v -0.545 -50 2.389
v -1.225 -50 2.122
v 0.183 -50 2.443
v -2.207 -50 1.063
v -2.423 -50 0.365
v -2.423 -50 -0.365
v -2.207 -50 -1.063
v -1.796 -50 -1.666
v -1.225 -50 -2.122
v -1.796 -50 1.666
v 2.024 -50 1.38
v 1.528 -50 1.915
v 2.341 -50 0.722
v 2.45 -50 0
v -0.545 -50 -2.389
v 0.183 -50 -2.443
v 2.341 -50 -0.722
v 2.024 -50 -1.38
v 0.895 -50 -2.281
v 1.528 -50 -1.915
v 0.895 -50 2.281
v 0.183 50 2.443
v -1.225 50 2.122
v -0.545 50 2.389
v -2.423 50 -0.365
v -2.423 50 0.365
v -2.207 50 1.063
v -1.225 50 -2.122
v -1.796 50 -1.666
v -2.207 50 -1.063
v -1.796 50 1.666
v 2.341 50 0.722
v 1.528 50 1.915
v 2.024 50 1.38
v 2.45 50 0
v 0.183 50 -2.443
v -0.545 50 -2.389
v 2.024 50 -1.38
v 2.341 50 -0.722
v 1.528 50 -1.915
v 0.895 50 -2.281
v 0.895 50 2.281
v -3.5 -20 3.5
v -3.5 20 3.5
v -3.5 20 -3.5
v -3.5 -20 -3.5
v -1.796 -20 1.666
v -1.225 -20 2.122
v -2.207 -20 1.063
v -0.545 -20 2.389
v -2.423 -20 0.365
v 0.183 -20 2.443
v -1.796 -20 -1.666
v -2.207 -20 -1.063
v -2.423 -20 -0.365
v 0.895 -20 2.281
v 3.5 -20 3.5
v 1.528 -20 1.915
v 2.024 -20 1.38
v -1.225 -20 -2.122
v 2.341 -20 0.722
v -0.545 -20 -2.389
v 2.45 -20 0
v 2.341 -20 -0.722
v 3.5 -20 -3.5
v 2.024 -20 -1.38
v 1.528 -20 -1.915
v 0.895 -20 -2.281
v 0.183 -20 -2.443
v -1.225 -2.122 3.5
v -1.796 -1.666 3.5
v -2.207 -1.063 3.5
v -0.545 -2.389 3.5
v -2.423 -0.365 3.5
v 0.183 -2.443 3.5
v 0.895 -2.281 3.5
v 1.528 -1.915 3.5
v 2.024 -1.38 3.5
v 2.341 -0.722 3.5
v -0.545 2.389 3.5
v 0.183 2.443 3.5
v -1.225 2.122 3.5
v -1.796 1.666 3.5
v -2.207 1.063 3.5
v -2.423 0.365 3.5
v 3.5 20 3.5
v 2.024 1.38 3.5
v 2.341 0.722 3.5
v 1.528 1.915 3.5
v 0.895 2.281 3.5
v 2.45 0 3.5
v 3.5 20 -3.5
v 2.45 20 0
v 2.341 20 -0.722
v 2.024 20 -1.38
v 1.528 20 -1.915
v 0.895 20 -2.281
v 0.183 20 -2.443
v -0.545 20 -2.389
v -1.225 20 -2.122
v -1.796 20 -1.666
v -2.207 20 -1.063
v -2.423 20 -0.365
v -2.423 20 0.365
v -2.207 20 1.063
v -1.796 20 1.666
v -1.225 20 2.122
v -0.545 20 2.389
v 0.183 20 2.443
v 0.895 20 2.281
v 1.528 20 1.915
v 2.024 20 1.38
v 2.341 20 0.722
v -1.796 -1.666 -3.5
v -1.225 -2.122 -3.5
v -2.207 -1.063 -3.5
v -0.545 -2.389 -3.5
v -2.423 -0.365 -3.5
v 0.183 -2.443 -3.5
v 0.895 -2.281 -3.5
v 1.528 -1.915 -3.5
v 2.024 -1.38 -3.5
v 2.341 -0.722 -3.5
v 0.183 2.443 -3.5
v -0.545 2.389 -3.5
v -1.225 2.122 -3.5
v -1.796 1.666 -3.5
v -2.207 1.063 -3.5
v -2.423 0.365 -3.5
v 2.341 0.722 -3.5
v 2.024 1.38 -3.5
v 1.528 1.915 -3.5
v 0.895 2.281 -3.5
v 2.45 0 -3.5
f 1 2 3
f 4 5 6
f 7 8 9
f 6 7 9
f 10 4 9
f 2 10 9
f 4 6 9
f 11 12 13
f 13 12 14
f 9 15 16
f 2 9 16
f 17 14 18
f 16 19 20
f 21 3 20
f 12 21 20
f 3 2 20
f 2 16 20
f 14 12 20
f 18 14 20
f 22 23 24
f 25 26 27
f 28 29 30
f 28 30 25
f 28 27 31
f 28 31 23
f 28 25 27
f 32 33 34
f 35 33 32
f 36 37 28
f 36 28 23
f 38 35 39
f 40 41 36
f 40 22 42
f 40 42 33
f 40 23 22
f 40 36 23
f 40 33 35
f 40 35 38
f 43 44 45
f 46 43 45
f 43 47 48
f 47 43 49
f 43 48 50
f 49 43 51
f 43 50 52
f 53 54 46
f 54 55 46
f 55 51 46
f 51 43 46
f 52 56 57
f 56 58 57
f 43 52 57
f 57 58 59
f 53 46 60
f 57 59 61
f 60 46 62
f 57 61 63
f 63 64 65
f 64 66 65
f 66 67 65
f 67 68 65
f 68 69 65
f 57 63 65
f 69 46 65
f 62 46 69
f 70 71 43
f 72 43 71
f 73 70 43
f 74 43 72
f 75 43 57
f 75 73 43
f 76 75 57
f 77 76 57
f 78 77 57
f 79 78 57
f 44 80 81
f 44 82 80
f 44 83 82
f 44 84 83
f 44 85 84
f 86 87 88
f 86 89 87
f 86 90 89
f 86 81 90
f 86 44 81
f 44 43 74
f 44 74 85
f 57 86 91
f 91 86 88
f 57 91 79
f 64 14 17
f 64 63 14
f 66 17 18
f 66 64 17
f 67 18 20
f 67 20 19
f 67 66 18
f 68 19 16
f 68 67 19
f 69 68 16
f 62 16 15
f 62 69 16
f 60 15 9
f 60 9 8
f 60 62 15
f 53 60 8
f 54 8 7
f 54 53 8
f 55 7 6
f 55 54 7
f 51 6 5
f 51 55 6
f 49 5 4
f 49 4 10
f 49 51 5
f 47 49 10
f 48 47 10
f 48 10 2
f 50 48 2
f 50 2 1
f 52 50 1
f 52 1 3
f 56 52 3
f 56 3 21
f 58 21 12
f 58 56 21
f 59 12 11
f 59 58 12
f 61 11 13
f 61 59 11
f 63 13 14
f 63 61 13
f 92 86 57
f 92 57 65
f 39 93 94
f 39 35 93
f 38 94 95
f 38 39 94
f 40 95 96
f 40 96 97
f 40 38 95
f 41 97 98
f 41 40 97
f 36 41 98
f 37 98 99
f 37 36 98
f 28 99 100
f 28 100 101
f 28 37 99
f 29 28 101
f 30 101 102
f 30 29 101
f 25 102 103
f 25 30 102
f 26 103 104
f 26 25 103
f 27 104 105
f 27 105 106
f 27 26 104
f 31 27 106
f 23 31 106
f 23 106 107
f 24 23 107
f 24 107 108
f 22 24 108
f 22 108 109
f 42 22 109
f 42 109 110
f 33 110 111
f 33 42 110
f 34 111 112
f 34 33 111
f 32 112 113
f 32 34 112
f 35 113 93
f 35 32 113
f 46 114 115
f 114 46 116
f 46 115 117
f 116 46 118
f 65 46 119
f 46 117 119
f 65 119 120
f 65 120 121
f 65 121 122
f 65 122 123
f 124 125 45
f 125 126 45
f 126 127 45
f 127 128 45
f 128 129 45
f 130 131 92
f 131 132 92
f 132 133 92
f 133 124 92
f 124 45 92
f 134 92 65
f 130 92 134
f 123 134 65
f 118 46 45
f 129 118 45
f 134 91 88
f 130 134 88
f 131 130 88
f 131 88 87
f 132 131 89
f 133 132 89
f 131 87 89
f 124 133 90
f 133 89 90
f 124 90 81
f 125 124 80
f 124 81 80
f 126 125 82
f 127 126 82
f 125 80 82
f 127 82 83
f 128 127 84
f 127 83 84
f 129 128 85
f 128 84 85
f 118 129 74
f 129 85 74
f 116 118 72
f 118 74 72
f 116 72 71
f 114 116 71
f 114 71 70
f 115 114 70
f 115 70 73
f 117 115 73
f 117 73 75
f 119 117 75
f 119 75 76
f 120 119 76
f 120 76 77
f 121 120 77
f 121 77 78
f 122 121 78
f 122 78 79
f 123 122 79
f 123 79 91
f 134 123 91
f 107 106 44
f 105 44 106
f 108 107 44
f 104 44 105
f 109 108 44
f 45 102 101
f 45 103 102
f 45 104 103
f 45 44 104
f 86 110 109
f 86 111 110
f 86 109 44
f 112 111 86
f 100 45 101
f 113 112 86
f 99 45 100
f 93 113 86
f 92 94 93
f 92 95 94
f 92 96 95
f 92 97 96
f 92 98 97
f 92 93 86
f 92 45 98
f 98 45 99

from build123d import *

# Parameters (mm, degrees)
SKETCH1_R           = 2.45
BOSS_EXTRUDE1_DEPTH = 50
BOSS_EXTRUDE2_START = -50
SKETCH1_2_R         = 2.45
BOSS_EXTRUDE2_DEPTH = 50
SKETCH2_W           = 7
SKETCH2_H           = 7
BOSS_EXTRUDE3_DEPTH = 20
SKETCH2_2_W         = 7
SKETCH2_2_H         = 7
BOSS_EXTRUDE4_DEPTH = 20
SKETCH3_R           = 2.45
CUT_EXTRUDE1_DEPTH  = 51.608793702


with BuildPart() as part:
    # Sketch1 → Boss-Extrude1 (new body)
    with BuildSketch(Plane(origin=(0, 0, 0), x_dir=(1, 0, 0), z_dir=(0, 1, 0))):
        Circle(SKETCH1_R)
    extrude(amount=BOSS_EXTRUDE1_DEPTH)

    # Sketch1<2> → Boss-Extrude2 (add)
    with BuildSketch(Plane(origin=(0, 0, 0), x_dir=(1, 0, 0), z_dir=(0, 1, 0)).offset(BOSS_EXTRUDE2_START)):
        Circle(SKETCH1_2_R)
    extrude(amount=BOSS_EXTRUDE2_DEPTH)

    # Sketch2 → Boss-Extrude3 (add)
    with BuildSketch(Plane(origin=(0, 0, 0), x_dir=(1, 0, 0), z_dir=(0, 1, 0))):
        Rectangle(SKETCH2_W, SKETCH2_H)
    extrude(amount=BOSS_EXTRUDE3_DEPTH)

    # Sketch2<2> → Boss-Extrude4 (add)
    with BuildSketch(Plane(origin=(0, 0, 0), x_dir=(1, 0, 0), z_dir=(0, 1, 0))):
        Rectangle(SKETCH2_2_W, SKETCH2_2_H)
    extrude(amount=-BOSS_EXTRUDE4_DEPTH)

    # Sketch3 → Cut-Extrude1 (cut, through all)
    with BuildSketch(Plane.XY.offset(3.5)):
        Circle(SKETCH3_R)
    extrude(amount=-CUT_EXTRUDE1_DEPTH, mode=Mode.SUBTRACT)


solid = part.part
